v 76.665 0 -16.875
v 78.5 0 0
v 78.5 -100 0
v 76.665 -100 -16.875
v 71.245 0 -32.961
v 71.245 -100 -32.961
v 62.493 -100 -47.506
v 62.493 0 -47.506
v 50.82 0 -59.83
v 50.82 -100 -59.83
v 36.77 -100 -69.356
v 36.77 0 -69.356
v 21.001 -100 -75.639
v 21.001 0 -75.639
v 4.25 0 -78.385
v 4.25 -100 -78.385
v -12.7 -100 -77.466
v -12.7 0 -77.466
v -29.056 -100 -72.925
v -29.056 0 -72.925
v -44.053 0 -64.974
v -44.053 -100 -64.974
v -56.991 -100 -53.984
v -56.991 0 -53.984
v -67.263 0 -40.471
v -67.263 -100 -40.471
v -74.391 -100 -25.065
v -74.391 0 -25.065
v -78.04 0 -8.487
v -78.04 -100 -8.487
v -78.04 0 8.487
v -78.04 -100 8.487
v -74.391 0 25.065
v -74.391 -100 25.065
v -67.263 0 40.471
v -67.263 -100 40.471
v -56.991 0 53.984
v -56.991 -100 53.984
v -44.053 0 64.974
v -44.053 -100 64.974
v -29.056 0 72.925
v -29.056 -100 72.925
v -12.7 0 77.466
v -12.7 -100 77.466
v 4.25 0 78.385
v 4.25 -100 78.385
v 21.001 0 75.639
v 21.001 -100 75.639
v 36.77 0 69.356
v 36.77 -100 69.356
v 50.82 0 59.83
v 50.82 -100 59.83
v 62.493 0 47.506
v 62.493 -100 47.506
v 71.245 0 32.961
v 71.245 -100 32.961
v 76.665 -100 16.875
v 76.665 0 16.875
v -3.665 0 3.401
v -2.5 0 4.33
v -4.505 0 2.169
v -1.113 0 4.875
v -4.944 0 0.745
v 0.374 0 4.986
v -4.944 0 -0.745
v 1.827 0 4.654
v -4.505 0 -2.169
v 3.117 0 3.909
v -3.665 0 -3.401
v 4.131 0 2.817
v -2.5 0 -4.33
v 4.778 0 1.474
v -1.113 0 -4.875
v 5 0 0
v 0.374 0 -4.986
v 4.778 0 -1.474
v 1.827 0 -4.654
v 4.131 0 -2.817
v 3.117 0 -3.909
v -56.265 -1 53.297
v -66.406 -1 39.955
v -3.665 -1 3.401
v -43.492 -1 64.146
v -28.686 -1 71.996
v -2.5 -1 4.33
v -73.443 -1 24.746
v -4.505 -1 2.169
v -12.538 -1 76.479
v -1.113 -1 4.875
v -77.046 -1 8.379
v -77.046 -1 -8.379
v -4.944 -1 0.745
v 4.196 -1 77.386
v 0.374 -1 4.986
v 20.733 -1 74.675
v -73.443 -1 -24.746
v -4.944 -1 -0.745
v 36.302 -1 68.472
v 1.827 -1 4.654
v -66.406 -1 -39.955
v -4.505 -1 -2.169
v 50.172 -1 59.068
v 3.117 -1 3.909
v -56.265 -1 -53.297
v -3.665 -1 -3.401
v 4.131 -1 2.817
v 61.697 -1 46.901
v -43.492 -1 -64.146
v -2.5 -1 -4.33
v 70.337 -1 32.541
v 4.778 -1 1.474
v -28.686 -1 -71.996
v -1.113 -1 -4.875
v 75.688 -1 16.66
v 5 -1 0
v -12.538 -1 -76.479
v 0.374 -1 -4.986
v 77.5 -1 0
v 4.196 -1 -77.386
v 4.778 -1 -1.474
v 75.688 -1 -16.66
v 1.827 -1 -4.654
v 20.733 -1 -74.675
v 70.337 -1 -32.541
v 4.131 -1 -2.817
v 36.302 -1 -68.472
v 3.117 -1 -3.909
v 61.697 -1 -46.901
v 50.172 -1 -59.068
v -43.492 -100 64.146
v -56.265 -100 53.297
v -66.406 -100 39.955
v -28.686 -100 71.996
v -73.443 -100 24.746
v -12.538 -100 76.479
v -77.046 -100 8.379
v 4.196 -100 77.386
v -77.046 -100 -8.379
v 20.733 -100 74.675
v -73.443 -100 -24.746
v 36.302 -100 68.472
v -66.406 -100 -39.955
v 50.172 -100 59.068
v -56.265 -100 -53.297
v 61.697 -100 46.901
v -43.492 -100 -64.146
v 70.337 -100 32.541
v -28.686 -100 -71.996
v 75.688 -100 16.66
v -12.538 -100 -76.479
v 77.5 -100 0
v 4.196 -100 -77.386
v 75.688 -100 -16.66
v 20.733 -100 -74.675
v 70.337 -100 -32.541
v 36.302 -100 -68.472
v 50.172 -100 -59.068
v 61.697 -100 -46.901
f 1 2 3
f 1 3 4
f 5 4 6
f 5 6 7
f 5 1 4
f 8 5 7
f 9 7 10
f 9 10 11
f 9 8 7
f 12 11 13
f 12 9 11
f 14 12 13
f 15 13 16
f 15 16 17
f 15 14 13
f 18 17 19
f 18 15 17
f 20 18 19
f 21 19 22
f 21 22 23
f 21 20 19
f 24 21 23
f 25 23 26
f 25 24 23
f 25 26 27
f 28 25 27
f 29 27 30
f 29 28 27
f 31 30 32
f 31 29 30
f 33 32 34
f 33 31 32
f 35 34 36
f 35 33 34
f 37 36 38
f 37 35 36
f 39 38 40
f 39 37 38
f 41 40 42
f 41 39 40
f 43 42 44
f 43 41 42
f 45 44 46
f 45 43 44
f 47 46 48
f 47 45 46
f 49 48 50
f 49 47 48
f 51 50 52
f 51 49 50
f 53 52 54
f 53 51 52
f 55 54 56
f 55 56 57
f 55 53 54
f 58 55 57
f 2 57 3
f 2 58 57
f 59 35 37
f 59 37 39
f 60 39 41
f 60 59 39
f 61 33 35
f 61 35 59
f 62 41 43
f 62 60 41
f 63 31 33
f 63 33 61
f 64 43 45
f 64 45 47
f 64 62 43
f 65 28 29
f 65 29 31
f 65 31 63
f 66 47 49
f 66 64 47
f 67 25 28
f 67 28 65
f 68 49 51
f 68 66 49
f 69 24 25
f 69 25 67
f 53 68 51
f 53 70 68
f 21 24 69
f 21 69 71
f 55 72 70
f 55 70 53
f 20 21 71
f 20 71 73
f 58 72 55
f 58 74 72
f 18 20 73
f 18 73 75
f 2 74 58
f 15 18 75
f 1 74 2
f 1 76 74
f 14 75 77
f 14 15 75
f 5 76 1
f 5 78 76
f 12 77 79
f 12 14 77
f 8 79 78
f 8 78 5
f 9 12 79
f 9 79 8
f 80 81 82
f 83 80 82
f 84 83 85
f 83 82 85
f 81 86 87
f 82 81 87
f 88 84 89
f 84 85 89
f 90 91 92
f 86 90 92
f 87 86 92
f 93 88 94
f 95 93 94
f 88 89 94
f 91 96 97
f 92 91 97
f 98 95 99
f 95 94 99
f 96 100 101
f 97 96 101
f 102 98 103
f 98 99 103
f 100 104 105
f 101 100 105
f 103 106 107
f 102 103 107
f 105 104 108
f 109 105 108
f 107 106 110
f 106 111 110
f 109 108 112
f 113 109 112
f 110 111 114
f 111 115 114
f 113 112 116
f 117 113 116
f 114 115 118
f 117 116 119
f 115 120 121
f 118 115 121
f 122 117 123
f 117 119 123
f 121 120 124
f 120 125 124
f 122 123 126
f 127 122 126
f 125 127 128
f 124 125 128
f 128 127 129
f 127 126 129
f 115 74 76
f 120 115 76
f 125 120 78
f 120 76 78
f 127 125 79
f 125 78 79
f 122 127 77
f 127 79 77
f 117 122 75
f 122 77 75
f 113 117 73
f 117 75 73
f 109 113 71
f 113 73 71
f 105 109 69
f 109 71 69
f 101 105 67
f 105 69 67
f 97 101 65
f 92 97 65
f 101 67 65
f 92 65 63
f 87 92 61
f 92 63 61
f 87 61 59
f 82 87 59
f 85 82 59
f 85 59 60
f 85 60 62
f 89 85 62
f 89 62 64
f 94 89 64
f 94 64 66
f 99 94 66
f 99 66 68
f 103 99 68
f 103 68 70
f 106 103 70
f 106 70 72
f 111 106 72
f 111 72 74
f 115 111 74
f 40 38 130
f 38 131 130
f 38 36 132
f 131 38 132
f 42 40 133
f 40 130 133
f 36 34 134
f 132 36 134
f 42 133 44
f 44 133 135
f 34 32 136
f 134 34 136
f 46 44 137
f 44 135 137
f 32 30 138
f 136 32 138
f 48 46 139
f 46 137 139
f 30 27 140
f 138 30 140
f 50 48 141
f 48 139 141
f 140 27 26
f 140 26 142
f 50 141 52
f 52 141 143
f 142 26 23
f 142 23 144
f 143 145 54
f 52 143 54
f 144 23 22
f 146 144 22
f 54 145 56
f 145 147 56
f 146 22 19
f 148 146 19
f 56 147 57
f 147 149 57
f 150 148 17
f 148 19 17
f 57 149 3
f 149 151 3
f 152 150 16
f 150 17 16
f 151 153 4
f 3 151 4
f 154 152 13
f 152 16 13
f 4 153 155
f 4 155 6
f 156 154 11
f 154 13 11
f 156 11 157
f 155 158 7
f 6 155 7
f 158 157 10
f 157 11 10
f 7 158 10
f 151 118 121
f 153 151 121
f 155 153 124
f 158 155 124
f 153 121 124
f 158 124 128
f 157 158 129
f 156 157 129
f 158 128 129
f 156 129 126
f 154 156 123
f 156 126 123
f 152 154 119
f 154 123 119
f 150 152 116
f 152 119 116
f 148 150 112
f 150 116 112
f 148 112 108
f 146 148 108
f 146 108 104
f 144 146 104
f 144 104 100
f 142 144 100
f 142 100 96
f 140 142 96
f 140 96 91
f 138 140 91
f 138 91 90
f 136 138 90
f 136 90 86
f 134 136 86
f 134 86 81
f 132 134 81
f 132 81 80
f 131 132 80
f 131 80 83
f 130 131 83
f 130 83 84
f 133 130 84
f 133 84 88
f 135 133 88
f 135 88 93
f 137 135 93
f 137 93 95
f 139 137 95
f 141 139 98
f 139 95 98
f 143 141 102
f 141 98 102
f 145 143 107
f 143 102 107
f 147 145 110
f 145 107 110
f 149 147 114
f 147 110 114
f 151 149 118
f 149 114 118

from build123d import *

# Parameters (mm, degrees)
SKETCH1_R           = 77.5
BOSS_EXTRUDE1_DEPTH = 1
SKETCH1_2_R         = 78.5
SKETCH1_2_R_2       = 77.5
EXTRUDE_THIN1_DEPTH = 100
SKETCH2_R           = 5
CUT_EXTRUDE1_DEPTH  = 101


with BuildPart() as part:
    # Sketch1 → Boss-Extrude1 (new body)
    with BuildSketch(Plane(origin=(0, 0, 0), x_dir=(1, 0, 0), z_dir=(0, 1, 0))):
        Circle(SKETCH1_R)
    extrude(amount=-BOSS_EXTRUDE1_DEPTH)

    # Sketch1<2> → Extrude-Thin1 (add)
    with BuildSketch(Plane(origin=(0, 0, 0), x_dir=(1, 0, 0), z_dir=(0, 1, 0))):
        Circle(SKETCH1_2_R)
        Circle(SKETCH1_2_R_2, mode=Mode.SUBTRACT)
    extrude(amount=-EXTRUDE_THIN1_DEPTH)

    # Sketch2 → Cut-Extrude1 (cut, through all)
    with BuildSketch(Plane(origin=(0, 0, 0), x_dir=(1, 0, 0), z_dir=(0, 1, 0))):
        Circle(SKETCH2_R)
    extrude(amount=-CUT_EXTRUDE1_DEPTH, mode=Mode.SUBTRACT)


solid = part.part
